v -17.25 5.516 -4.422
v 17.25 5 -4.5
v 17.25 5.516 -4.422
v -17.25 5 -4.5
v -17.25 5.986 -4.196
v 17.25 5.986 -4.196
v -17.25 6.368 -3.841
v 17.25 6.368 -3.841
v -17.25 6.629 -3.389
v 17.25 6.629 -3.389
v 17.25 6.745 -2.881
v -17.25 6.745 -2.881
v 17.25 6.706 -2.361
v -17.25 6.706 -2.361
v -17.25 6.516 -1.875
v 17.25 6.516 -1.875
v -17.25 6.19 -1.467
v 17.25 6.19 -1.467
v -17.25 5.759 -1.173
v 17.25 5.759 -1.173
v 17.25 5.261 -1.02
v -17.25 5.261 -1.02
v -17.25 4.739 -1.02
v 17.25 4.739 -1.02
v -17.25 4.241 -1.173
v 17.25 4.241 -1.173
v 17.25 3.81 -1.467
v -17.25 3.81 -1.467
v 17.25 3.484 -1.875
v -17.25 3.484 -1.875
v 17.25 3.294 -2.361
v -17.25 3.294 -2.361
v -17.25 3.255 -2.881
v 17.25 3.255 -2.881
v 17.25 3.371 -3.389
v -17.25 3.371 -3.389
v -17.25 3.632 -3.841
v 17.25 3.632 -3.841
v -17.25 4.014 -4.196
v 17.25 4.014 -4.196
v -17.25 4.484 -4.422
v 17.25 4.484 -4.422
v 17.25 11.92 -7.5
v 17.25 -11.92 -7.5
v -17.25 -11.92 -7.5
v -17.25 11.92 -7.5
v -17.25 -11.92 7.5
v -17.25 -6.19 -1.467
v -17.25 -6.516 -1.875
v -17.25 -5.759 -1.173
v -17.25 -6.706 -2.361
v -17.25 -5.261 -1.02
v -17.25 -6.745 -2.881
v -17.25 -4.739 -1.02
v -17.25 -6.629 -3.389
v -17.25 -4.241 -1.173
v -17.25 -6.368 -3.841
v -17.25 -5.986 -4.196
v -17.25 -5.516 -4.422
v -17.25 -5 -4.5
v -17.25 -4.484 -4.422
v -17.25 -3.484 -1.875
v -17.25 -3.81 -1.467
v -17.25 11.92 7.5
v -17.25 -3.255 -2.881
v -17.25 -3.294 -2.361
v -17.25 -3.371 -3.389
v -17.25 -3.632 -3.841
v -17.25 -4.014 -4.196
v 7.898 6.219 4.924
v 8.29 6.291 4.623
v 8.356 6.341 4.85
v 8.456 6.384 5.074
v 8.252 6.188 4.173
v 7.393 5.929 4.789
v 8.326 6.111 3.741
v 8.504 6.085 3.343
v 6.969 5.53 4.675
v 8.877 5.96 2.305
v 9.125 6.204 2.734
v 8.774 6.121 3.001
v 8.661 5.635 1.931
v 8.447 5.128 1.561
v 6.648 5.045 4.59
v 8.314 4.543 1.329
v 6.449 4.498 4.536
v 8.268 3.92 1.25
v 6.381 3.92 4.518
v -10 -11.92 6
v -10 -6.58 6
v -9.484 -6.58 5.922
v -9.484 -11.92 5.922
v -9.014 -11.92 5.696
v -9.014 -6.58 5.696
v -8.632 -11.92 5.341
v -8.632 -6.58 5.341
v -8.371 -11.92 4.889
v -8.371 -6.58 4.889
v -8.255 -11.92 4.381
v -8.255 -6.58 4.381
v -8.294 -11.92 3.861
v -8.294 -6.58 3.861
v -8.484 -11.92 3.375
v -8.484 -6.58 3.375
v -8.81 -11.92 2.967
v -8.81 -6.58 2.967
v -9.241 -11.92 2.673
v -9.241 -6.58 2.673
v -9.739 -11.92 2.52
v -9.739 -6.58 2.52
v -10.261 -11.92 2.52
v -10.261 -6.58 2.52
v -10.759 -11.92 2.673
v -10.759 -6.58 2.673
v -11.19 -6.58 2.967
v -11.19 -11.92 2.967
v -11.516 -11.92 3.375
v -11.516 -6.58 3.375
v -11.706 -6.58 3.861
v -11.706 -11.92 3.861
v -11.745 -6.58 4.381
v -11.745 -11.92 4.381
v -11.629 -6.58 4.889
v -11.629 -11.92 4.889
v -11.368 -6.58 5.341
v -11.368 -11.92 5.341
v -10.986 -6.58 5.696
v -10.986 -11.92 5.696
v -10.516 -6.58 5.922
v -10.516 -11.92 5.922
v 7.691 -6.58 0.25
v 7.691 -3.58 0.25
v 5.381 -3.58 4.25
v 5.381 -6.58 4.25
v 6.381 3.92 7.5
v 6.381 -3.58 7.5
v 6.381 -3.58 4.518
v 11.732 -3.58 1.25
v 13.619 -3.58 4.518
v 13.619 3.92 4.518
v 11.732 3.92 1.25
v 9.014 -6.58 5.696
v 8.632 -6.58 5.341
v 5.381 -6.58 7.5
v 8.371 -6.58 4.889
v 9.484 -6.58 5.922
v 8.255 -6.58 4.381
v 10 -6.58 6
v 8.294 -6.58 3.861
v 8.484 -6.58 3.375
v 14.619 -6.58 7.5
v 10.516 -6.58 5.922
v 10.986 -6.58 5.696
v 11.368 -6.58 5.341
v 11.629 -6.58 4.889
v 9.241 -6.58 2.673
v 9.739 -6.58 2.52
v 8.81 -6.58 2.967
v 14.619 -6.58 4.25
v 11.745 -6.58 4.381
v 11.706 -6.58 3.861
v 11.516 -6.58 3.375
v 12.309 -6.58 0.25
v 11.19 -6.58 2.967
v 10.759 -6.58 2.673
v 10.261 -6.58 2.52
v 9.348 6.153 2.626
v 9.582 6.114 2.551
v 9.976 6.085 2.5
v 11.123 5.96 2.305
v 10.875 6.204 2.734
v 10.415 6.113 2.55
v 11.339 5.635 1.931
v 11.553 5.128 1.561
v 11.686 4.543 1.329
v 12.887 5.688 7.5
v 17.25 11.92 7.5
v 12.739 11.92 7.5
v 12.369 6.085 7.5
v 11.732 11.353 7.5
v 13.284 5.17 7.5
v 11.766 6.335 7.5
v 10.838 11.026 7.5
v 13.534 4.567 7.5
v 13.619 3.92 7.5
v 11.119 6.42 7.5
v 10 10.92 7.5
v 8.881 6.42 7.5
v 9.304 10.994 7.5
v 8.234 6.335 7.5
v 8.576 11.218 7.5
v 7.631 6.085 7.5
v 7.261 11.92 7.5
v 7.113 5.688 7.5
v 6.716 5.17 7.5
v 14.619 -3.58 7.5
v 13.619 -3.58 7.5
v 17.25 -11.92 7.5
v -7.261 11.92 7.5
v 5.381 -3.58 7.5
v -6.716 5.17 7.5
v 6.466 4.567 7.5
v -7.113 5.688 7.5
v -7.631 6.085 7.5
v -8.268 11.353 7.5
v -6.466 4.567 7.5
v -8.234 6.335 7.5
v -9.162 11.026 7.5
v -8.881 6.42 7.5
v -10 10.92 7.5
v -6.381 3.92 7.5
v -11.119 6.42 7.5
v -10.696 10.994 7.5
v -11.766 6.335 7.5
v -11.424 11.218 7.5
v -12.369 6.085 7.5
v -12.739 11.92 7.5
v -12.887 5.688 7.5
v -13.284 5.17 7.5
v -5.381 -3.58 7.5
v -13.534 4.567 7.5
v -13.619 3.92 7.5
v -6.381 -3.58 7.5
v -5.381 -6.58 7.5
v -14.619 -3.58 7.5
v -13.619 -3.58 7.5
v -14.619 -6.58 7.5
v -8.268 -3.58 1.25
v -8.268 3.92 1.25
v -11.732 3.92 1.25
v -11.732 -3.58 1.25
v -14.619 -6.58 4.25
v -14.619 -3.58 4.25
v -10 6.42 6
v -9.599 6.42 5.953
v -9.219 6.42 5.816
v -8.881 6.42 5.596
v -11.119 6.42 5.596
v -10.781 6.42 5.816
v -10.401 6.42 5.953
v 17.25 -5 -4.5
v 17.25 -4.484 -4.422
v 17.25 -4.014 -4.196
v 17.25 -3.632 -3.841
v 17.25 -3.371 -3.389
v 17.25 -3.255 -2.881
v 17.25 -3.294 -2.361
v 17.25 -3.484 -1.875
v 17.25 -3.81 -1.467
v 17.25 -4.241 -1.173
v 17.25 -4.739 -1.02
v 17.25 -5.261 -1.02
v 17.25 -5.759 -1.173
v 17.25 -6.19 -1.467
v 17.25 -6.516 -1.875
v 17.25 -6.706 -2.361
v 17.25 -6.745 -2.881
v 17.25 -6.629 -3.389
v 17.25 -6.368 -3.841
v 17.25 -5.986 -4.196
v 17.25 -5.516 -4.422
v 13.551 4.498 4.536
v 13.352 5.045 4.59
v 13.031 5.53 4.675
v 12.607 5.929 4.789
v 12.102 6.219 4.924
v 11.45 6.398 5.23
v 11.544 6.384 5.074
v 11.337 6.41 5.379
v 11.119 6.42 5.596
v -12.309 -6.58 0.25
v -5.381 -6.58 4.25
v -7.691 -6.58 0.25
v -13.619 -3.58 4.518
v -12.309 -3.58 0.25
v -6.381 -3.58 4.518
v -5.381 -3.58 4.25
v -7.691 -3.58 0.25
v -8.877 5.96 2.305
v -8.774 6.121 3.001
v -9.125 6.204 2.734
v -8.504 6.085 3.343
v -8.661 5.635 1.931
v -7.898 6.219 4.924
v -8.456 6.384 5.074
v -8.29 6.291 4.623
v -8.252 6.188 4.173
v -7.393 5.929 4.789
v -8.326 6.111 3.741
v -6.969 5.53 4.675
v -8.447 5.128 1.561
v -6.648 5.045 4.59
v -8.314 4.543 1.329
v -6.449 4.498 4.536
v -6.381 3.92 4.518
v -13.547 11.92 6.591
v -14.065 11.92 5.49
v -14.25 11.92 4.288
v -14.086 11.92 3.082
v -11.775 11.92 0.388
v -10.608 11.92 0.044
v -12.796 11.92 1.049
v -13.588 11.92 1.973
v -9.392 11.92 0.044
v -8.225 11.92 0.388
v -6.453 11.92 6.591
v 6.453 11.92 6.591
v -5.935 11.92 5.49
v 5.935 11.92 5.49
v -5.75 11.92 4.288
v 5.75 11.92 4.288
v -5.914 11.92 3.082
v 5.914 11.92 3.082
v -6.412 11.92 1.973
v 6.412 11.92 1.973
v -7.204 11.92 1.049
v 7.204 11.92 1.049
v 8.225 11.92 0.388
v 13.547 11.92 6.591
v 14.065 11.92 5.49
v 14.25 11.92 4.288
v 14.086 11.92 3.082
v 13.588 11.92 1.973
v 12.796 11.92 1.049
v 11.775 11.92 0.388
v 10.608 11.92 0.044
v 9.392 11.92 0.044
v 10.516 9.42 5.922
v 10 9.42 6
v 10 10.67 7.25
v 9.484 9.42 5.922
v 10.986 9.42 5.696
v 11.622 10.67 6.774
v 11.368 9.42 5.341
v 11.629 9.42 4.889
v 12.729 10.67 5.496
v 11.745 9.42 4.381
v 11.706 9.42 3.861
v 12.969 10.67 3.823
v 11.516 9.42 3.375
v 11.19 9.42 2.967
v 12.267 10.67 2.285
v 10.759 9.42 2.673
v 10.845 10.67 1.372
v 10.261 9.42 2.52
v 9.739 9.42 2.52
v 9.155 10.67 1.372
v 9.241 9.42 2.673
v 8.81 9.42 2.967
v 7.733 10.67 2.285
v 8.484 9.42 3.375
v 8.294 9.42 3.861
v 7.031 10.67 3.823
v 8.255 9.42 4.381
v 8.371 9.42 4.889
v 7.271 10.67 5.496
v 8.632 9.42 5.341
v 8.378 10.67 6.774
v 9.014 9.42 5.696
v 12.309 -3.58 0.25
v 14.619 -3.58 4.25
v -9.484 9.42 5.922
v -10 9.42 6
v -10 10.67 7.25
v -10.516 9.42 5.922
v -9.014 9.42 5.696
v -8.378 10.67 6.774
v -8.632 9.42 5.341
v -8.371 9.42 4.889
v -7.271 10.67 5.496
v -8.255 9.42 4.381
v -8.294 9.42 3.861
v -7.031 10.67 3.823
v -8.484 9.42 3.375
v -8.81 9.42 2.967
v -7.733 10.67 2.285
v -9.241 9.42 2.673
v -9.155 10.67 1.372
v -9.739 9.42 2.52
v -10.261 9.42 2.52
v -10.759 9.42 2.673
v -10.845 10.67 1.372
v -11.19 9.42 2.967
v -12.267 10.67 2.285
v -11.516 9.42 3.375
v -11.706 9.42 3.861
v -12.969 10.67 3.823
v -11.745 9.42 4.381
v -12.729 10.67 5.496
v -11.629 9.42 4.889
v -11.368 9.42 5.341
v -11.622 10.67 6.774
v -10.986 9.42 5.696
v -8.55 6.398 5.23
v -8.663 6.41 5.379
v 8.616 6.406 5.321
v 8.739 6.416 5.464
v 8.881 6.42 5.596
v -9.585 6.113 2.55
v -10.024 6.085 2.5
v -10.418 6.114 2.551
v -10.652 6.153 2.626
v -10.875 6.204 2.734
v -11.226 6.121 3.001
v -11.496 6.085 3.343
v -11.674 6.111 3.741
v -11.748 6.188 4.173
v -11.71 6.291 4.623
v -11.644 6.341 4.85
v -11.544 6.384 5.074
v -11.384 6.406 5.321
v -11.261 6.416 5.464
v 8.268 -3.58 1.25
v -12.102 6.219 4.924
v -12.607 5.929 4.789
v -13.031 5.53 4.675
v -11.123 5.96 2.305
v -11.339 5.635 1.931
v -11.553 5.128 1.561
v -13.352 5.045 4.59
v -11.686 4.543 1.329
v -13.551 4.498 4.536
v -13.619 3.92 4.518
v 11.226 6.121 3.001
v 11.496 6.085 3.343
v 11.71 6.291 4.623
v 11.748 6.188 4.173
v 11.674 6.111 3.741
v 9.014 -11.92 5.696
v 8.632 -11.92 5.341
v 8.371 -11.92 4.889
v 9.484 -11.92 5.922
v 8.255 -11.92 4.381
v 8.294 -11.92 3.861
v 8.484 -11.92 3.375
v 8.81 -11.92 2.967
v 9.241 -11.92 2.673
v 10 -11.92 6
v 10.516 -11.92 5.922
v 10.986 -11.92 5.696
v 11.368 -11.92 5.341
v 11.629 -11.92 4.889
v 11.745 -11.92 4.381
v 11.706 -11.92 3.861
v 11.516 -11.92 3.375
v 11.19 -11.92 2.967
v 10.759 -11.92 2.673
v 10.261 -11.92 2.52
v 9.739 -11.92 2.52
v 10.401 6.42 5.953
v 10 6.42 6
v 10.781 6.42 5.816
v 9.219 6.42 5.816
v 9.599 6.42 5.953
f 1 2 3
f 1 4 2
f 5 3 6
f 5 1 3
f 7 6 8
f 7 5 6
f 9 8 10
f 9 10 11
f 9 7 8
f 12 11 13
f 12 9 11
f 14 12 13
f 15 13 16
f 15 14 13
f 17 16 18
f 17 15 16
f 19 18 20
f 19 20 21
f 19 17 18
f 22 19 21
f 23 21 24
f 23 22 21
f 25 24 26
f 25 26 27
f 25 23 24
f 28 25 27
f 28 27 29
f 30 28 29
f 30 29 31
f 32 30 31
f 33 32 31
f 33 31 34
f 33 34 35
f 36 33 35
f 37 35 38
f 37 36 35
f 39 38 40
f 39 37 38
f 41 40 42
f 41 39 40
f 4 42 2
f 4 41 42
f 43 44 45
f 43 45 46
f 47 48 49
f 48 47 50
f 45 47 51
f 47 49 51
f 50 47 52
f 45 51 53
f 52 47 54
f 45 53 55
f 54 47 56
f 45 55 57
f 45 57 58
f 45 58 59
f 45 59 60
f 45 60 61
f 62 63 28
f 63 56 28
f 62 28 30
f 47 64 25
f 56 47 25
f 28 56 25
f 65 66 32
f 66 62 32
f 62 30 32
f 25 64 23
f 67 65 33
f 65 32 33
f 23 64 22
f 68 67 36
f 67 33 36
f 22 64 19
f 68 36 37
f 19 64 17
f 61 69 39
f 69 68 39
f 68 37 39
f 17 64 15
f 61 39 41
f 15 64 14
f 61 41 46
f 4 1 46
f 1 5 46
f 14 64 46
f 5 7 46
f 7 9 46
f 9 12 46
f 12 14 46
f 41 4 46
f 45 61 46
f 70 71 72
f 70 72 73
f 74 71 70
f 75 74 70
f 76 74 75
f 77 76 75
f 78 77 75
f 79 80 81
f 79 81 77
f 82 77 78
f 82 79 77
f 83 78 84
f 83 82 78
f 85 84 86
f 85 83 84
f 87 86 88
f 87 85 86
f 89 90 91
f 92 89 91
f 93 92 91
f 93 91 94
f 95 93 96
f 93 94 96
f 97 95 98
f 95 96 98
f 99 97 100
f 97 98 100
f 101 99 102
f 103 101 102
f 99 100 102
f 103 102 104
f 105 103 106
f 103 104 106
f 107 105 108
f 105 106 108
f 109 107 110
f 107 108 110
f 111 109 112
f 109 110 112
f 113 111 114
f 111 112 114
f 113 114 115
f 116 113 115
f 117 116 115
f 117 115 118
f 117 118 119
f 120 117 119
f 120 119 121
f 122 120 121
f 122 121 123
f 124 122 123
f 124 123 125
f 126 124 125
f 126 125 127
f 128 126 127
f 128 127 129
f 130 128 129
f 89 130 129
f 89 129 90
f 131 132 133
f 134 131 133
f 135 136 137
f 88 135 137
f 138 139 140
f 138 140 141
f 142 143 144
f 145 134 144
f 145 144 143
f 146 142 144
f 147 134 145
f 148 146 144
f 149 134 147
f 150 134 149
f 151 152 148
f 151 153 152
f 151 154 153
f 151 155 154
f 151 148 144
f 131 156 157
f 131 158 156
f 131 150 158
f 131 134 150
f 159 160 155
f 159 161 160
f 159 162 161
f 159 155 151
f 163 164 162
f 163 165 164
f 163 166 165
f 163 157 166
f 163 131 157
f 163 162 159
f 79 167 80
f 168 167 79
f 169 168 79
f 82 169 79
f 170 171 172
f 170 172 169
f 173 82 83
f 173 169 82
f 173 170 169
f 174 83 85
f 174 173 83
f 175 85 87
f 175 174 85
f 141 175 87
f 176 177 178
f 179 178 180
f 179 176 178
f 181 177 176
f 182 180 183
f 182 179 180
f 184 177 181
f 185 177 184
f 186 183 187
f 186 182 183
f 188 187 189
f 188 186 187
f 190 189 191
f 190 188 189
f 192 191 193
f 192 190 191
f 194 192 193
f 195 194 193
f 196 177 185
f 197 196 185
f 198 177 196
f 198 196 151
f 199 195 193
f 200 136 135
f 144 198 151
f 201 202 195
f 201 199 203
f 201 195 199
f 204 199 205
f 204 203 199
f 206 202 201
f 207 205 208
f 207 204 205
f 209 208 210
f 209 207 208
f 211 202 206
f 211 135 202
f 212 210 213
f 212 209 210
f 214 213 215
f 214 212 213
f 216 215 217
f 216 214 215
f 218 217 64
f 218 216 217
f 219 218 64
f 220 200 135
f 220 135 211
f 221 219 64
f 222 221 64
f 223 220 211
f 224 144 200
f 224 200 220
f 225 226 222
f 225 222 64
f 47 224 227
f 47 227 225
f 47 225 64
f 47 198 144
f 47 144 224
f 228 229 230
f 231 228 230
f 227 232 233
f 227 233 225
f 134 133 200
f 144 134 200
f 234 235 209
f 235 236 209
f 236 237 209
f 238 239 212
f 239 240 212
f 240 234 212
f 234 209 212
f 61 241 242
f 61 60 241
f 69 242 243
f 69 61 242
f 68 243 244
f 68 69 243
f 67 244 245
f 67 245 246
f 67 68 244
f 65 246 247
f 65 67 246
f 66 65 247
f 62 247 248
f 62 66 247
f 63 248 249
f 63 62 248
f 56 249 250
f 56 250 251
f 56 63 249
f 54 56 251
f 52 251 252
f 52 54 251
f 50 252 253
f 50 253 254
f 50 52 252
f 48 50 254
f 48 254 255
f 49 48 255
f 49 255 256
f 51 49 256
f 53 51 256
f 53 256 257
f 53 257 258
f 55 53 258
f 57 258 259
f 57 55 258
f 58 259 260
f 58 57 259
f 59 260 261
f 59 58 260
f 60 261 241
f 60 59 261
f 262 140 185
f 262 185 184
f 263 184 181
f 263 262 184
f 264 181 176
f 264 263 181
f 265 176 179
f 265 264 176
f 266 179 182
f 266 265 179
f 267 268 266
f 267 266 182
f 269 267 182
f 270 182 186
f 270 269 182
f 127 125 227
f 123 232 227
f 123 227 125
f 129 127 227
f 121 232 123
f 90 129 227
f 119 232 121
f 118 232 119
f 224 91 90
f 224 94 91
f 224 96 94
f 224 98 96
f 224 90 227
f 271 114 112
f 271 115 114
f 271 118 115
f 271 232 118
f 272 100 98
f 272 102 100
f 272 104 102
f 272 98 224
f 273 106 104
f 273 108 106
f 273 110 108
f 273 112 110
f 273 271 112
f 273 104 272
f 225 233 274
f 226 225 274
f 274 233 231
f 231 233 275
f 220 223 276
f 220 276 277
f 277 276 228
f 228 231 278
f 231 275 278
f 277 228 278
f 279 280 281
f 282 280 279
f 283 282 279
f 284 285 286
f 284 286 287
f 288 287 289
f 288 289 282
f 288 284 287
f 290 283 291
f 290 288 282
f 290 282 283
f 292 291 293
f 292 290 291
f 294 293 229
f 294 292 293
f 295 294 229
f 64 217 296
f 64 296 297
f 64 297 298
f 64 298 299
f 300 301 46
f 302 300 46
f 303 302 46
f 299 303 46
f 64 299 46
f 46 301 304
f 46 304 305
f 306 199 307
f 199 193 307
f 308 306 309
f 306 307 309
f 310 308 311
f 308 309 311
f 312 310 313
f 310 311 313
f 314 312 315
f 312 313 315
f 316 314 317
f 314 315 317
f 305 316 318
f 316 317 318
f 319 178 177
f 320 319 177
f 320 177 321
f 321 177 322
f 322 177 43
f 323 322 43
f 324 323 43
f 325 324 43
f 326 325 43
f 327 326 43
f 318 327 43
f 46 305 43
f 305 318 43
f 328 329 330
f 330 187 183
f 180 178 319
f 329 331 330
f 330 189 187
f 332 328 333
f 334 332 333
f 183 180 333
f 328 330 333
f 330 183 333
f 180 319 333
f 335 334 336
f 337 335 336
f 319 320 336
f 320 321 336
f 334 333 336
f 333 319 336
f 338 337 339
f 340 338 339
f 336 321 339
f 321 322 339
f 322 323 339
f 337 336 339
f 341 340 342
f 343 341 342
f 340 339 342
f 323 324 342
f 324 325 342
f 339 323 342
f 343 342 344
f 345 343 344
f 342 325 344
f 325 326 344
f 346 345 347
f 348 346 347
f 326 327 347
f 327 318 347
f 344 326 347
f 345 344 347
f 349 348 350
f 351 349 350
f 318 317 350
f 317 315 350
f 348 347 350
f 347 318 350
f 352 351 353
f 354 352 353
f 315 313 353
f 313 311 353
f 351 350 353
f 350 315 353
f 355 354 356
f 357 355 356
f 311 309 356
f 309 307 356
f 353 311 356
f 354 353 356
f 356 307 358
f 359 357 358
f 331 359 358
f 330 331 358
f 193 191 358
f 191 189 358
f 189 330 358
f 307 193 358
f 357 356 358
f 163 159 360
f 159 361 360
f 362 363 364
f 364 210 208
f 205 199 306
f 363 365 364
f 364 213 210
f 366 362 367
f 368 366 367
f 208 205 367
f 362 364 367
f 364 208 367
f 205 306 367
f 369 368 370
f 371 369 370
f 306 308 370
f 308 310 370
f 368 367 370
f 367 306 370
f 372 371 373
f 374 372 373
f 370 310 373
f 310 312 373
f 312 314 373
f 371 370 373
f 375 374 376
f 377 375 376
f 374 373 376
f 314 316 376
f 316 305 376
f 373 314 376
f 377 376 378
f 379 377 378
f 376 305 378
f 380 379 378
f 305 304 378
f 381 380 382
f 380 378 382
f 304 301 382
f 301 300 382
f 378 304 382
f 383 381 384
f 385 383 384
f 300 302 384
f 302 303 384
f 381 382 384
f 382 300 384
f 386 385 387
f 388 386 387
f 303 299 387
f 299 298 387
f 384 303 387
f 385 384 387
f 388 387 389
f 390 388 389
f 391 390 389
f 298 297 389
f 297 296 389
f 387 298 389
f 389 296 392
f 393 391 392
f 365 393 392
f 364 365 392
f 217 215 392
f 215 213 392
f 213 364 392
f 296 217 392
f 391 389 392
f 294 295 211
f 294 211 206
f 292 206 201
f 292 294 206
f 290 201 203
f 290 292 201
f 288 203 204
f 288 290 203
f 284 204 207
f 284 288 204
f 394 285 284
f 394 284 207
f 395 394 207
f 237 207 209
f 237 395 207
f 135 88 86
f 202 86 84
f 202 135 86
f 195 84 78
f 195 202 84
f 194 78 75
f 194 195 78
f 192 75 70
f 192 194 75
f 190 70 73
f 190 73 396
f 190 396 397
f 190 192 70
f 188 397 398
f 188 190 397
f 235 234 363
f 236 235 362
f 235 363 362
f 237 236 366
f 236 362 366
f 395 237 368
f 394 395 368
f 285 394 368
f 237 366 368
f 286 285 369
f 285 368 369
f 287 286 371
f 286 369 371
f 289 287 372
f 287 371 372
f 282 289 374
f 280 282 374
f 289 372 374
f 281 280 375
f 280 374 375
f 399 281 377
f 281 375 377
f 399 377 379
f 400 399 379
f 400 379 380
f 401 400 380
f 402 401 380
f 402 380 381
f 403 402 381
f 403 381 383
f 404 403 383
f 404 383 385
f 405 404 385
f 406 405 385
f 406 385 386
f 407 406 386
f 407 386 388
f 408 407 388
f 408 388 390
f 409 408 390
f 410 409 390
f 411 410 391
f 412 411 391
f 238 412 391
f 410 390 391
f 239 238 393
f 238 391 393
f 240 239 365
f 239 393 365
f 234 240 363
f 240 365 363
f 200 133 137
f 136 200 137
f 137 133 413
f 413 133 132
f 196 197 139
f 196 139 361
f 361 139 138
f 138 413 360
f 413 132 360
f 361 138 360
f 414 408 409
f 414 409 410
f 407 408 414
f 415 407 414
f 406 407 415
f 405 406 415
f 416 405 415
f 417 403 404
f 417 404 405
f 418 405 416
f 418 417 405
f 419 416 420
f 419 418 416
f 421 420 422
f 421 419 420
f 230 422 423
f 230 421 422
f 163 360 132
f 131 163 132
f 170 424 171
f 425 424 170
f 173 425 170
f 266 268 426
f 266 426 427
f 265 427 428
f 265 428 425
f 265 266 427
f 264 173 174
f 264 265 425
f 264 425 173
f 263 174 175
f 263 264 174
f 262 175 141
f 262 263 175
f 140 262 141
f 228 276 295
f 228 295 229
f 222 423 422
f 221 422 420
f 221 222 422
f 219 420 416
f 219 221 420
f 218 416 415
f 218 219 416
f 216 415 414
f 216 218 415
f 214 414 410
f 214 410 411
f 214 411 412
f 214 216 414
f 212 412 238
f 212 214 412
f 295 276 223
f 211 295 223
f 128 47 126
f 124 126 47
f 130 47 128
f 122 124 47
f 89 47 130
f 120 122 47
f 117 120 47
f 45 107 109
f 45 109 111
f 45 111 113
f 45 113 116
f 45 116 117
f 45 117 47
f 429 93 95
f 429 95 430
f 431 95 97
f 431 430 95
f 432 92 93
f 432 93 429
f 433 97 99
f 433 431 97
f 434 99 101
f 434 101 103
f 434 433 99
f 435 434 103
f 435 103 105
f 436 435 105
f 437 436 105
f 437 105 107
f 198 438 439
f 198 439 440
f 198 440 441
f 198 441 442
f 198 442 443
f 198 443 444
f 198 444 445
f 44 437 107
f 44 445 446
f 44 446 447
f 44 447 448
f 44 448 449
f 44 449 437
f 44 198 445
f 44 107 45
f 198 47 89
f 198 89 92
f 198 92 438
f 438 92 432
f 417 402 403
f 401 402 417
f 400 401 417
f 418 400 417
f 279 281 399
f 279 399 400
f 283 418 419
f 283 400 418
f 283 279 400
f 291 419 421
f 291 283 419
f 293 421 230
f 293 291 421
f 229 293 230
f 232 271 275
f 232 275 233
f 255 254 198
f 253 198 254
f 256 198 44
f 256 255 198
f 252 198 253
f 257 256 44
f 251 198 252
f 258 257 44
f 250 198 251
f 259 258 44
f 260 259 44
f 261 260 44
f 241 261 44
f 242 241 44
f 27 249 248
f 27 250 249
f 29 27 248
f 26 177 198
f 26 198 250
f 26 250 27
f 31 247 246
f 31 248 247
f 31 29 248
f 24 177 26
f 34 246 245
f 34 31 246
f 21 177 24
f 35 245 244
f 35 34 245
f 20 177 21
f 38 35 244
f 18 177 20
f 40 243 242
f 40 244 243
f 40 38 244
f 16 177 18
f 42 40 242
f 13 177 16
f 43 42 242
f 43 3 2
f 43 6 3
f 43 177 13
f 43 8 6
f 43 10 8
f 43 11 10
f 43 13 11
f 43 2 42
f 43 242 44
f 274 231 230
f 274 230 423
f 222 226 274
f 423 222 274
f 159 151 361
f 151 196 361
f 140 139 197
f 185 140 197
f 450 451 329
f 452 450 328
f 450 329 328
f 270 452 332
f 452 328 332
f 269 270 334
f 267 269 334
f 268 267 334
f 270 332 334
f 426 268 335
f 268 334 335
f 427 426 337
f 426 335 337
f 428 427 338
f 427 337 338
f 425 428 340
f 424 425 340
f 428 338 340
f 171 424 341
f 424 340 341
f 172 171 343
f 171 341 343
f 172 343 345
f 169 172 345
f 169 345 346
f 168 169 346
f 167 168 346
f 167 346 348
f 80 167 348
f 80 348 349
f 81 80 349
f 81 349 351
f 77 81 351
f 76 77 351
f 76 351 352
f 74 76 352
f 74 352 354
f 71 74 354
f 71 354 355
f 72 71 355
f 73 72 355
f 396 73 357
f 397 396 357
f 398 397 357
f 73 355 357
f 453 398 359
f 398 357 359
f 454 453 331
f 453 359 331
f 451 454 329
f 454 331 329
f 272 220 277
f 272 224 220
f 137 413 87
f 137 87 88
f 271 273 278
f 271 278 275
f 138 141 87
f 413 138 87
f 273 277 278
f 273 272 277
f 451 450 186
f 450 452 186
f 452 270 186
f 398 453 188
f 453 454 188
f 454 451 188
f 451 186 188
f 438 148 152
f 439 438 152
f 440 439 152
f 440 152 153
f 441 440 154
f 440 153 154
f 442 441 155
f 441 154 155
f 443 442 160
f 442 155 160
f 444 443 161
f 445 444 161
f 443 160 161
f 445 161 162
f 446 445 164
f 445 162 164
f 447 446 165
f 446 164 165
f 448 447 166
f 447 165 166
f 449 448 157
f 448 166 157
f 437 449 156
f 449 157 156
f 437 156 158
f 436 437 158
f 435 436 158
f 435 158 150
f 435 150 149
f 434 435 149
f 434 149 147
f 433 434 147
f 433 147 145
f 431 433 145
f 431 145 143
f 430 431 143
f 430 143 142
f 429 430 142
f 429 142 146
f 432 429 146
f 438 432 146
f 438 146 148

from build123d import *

# Parameters (mm, degrees)
SKETCH1_W           = 15
SKETCH1_H           = 23.84
SKETCH1_R           = 1.75
BOSS_EXTRUDE1_DEPTH = 17.25
SKETCH2_R           = 1.75
CUT_EXTRUDE1_DEPTH  = 31.367056163
CHAMFER1_SIZE       = 2.5
CUT_EXTRUDE2_DEPTH  = 1.5
CUT_EXTRUDE3_DEPTH  = 10
FILLET2_R           = 2.5


with BuildPart() as part:
    # Sketch1 → Boss-Extrude1 (new, symmetric)
    with BuildSketch(Plane(origin=(0, 0, 0), x_dir=(0, 0, -1), z_dir=(1, 0, 0))):
        Rectangle(SKETCH1_W, SKETCH1_H)
        with Locations((2.75, 5)):
            Circle(SKETCH1_R, mode=Mode.SUBTRACT)
        with Locations((2.75, -5)):
            Circle(SKETCH1_R, mode=Mode.SUBTRACT)
    extrude(amount=BOSS_EXTRUDE1_DEPTH, both=True)

    # Sketch2 → Cut-Extrude1 (cut, through all)
    with BuildSketch(Plane(origin=(0, 11.92, 0), x_dir=(1, 0, 0), z_dir=(0, 1, 0))):
        with Locations(Location((-10, -4.25, 0), (0, 0, 270))):
            Circle(SKETCH2_R)
        with Locations(Location((10, -4.25, 0), (0, 0, 270))):
            Circle(SKETCH2_R)
    extrude(amount=-CUT_EXTRUDE1_DEPTH, mode=Mode.SUBTRACT)

    # Chamfer1
    # the kernel refuses this chamfer: 2.5 mm, written as the material it takes off along each edge
    with BuildSketch(Plane(origin=(-10, 11.92, 4.25), x_dir=(0, 0, 1), z_dir=(-1, 0, 0))) as chamfer1_piece_1:
        Polygon((1.75, -CHAMFER1_SIZE), (1.75 + CHAMFER1_SIZE, 0), (1.75, 0), align=None)
    revolve(axis=Axis((-10, 11.92, 4.25), (0, 1, 0)), mode=Mode.SUBTRACT)
    with BuildSketch(Plane(origin=(10, 11.92, 4.25), x_dir=(0, 0, 1), z_dir=(-1, 0, 0))) as chamfer1_piece_2:
        Polygon((1.75, -CHAMFER1_SIZE), (1.75 + CHAMFER1_SIZE, 0), (1.75, 0), align=None)
    revolve(axis=Axis((10, 11.92, 4.25), (0, 1, 0)), mode=Mode.SUBTRACT)

    # Sketch3 → Cut-Extrude2 (cut, symmetric)
    with BuildSketch(Plane(origin=(0, -5.08, 0), x_dir=(1, 0, 0), z_dir=(0, 1, 0))):
        Polygon((-14.618802154, -4.25), (-14.618802154, -7.5), (-5.381197846, -7.5), (-5.381197846, -4.25), (-7.690598923, -0.25), (-12.309401077, -0.25), align=None)
        Polygon((14.618802154, -4.25), (12.309401077, -0.25), (7.690598923, -0.25), (5.381197846, -4.25), (5.381197846, -7.5), (14.618802154, -7.5), align=None)
    extrude(amount=CUT_EXTRUDE2_DEPTH, both=True, mode=Mode.SUBTRACT)

    # Sketch4 → Cut-Extrude3 (cut)
    with BuildSketch(Plane.XZ.offset(3.58)):
        Polygon((-13.618802154, 6.5), (-13.618802154, 7.5), (-6.381197846, 7.5), (-6.381197846, 6.5), (-6.381197846, 4.517949192), (-8.267949192, 1.25), (-11.732050808, 1.25), (-13.618802154, 4.517949192), align=None)
        Polygon((6.381197846, 6.5), (6.381197846, 7.5), (13.618802154, 7.5), (13.618802154, 6.5), (13.618802154, 4.517949192), (11.732050808, 1.25), (8.267949192, 1.25), (6.381197846, 4.517949192), align=None)
    extrude(amount=-CUT_EXTRUDE3_DEPTH, mode=Mode.SUBTRACT)

    # Fillet2
    # the kernel refuses this fillet: 2.5 mm, written as the material it adds along each edge
    with BuildSketch(Plane(origin=(-6.381197846, 6.42, -1.732050808), x_dir=(0, -1, 0), z_dir=(0, 0, 1))) as fillet2_piece_1_section:
        with BuildLine():
            CenterArc((FILLET2_R, -FILLET2_R), FILLET2_R, 90, 90)
            Line((0, -FILLET2_R), (0, 0))
            Line((0, 0), (FILLET2_R, 0))
        make_face()
    fillet2_piece_1 = extrude(amount=9.232050808, mode=Mode.PRIVATE)
    fillet2_piece_1 = fillet2_piece_1 - Plane(origin=(-10, 5.915860335, 4.25), x_dir=(0, 0, 1), z_dir=(0, 1, 0)) * Cylinder(1.75, 29, mode=Mode.PRIVATE)
    fillet2_piece_1 = split(fillet2_piece_1, bisect_by=Plane(origin=(-7.028837061, 5.915860335, 1.25), z_dir=(0, 0, 1)), keep=Keep.TOP, mode=Mode.PRIVATE)
    add(fillet2_piece_1)
    with BuildSketch(Plane(origin=(-3.256197846, 6.42, 9.930607966), x_dir=(-0.8660254037844386, 0, 0.5000000000000002), z_dir=(-0.5000000000000002, 0, -0.8660254037844386))) as fillet2_piece_2_section:
        with BuildLine():
            CenterArc((FILLET2_R, -FILLET2_R), FILLET2_R, 90, 90)
            Line((0, -FILLET2_R), (0, 0))
            Line((0, 0), (FILLET2_R, 0))
        make_face()
    fillet2_piece_2 = extrude(amount=16.273502692, mode=Mode.PRIVATE)
    fillet2_piece_2 = split(fillet2_piece_2, bisect_by=Plane(origin=(-7.669827192, 5.902188102, 7.5), z_dir=(0, 0, -1)), keep=Keep.TOP, mode=Mode.PRIVATE)
    fillet2_piece_2 = fillet2_piece_2 - Plane(origin=(-10, 5.902188102, 4.25), x_dir=(0, 0, 1), z_dir=(0, 1, 0)) * Cylinder(1.75, 43, mode=Mode.PRIVATE)
    fillet2_piece_2 = split(fillet2_piece_2, bisect_by=Plane(origin=(-7.669827192, 5.902188102, 1.25), z_dir=(0, 0, 1)), keep=Keep.TOP, mode=Mode.PRIVATE)
    add(fillet2_piece_2)
    with BuildSketch(Plane(origin=(-2.017949192, 6.42, 1.25), x_dir=(0, 0, 1), z_dir=(-1, 0, 0))) as fillet2_piece_3_section:
        with BuildLine():
            CenterArc((FILLET2_R, -FILLET2_R), FILLET2_R, 90, 90)
            Line((0, -FILLET2_R), (0, 0))
            Line((0, 0), (FILLET2_R, 0))
        make_face()
    fillet2_piece_3 = extrude(amount=15.964101615, mode=Mode.PRIVATE)
    fillet2_piece_3 = fillet2_piece_3 - Plane(origin=(-10, 5.877722241, 4.25), x_dir=(0, 0, 1), z_dir=(0, 1, 0)) * Cylinder(1.75, 42, mode=Mode.PRIVATE)
    fillet2_piece_3 = split(fillet2_piece_3, bisect_by=Plane(origin=(-11.54711457, 5.877722241, 0.92968104), z_dir=(0.8660254037844384, 0, 0.5000000000000006)), keep=Keep.TOP, mode=Mode.PRIVATE)
    add(fillet2_piece_3)
    with BuildSketch(Plane(origin=(-8.607050808, 6.42, -4.162658774), x_dir=(0.8660254037844384, 0, 0.5000000000000004), z_dir=(-0.5000000000000006, 0, 0.8660254037844384))) as fillet2_piece_4_section:
        with BuildLine():
            CenterArc((FILLET2_R, -FILLET2_R), FILLET2_R, 90, 90)
            Line((0, -FILLET2_R), (0, 0))
            Line((0, 0), (FILLET2_R, 0))
        make_face()
    fillet2_piece_4 = extrude(amount=16.273502692, mode=Mode.PRIVATE)
    fillet2_piece_4 = split(fillet2_piece_4, bisect_by=Plane(origin=(-12.330172795, 5.902188104, 7.5), z_dir=(0, 0, -1)), keep=Keep.TOP, mode=Mode.PRIVATE)
    fillet2_piece_4 = fillet2_piece_4 - Plane(origin=(-10, 5.902188104, 4.25), x_dir=(0, 0, 1), z_dir=(0, 1, 0)) * Cylinder(1.75, 43, mode=Mode.PRIVATE)
    fillet2_piece_4 = split(fillet2_piece_4, bisect_by=Plane(origin=(-12.330172795, 5.902188104, 1.25), z_dir=(0, 0, 1)), keep=Keep.TOP, mode=Mode.PRIVATE)
    add(fillet2_piece_4)
    with BuildSketch(Plane(origin=(-13.618802154, 6.42, 7.5), x_dir=(1, 0, 0), z_dir=(0, 0, -1))) as fillet2_piece_5_section:
        with BuildLine():
            CenterArc((FILLET2_R, FILLET2_R), FILLET2_R, 180, 90)
            Line((0, FILLET2_R), (0, 0))
            Line((0, 0), (FILLET2_R, 0))
        make_face()
    fillet2_piece_5 = extrude(amount=9.232050808, mode=Mode.PRIVATE)
    fillet2_piece_5 = fillet2_piece_5 - Plane(origin=(-10, 5.915860467, 4.25), x_dir=(0, 0, 1), z_dir=(0, 1, 0)) * Cylinder(1.75, 29, mode=Mode.PRIVATE)
    fillet2_piece_5 = split(fillet2_piece_5, bisect_by=Plane(origin=(-13.860643718, 5.915860467, 4.936831069), z_dir=(0.8660254037844384, 0, 0.5000000000000006)), keep=Keep.TOP, mode=Mode.PRIVATE)
    add(fillet2_piece_5)
    with BuildSketch(Plane(origin=(13.618802154, 6.42, -1.732050808), x_dir=(0, -1, 0), z_dir=(0, 0, 1))) as fillet2_piece_6_section:
        with BuildLine():
            CenterArc((FILLET2_R, -FILLET2_R), FILLET2_R, 90, 90)
            Line((0, -FILLET2_R), (0, 0))
            Line((0, 0), (FILLET2_R, 0))
        make_face()
    fillet2_piece_6 = extrude(amount=9.232050808, mode=Mode.PRIVATE)
    fillet2_piece_6 = fillet2_piece_6 - Plane(origin=(10, 5.915860335, 4.25), x_dir=(0, 0, 1), z_dir=(0, 1, 0)) * Cylinder(1.75, 29, mode=Mode.PRIVATE)
    fillet2_piece_6 = split(fillet2_piece_6, bisect_by=Plane(origin=(12.971162939, 5.915860335, 1.25), z_dir=(0, 0, 1)), keep=Keep.TOP, mode=Mode.PRIVATE)
    add(fillet2_piece_6)
    with BuildSketch(Plane(origin=(16.743802154, 6.42, 9.930607966), x_dir=(-0.8660254037844389, 0, 0.49999999999999956), z_dir=(-0.4999999999999996, 0, -0.8660254037844389))) as fillet2_piece_7_section:
        with BuildLine():
            CenterArc((FILLET2_R, -FILLET2_R), FILLET2_R, 90, 90)
            Line((0, -FILLET2_R), (0, 0))
            Line((0, 0), (FILLET2_R, 0))
        make_face()
    fillet2_piece_7 = extrude(amount=16.273502692, mode=Mode.PRIVATE)
    fillet2_piece_7 = split(fillet2_piece_7, bisect_by=Plane(origin=(12.330172808, 5.902188102, 7.5), z_dir=(0, 0, -1)), keep=Keep.TOP, mode=Mode.PRIVATE)
    fillet2_piece_7 = fillet2_piece_7 - Plane(origin=(10, 5.902188102, 4.25), x_dir=(0, 0, 1), z_dir=(0, 1, 0)) * Cylinder(1.75, 43, mode=Mode.PRIVATE)
    fillet2_piece_7 = split(fillet2_piece_7, bisect_by=Plane(origin=(12.330172808, 5.902188102, 1.25), z_dir=(0, 0, 1)), keep=Keep.TOP, mode=Mode.PRIVATE)
    add(fillet2_piece_7)
    with BuildSketch(Plane(origin=(17.982050808, 6.42, 1.25), x_dir=(0, 0, 1), z_dir=(-1, 0, 0))) as fillet2_piece_8_section:
        with BuildLine():
            CenterArc((FILLET2_R, -FILLET2_R), FILLET2_R, 90, 90)
            Line((0, -FILLET2_R), (0, 0))
            Line((0, 0), (FILLET2_R, 0))
        make_face()
    fillet2_piece_8 = extrude(amount=15.964101615, mode=Mode.PRIVATE)
    fillet2_piece_8 = fillet2_piece_8 - Plane(origin=(10, 5.877722241, 4.25), x_dir=(0, 0, 1), z_dir=(0, 1, 0)) * Cylinder(1.75, 42, mode=Mode.PRIVATE)
    fillet2_piece_8 = split(fillet2_piece_8, bisect_by=Plane(origin=(11.547114576, 5.877722241, 0.92968105), z_dir=(-0.8660254037844389, 0, 0.4999999999999996)), keep=Keep.TOP, mode=Mode.PRIVATE)
    add(fillet2_piece_8)
    with BuildSketch(Plane(origin=(11.392949192, 6.42, -4.162658774), x_dir=(0.8660254037844389, 0, 0.49999999999999956), z_dir=(-0.4999999999999996, 0, 0.8660254037844389))) as fillet2_piece_9_section:
        with BuildLine():
            CenterArc((FILLET2_R, -FILLET2_R), FILLET2_R, 90, 90)
            Line((0, -FILLET2_R), (0, 0))
            Line((0, 0), (FILLET2_R, 0))
        make_face()
    fillet2_piece_9 = extrude(amount=16.273502692, mode=Mode.PRIVATE)
    fillet2_piece_9 = split(fillet2_piece_9, bisect_by=Plane(origin=(7.669827205, 5.902188104, 7.5), z_dir=(0, 0, -1)), keep=Keep.TOP, mode=Mode.PRIVATE)
    fillet2_piece_9 = fillet2_piece_9 - Plane(origin=(10, 5.902188104, 4.25), x_dir=(0, 0, 1), z_dir=(0, 1, 0)) * Cylinder(1.75, 43, mode=Mode.PRIVATE)
    fillet2_piece_9 = split(fillet2_piece_9, bisect_by=Plane(origin=(7.669827205, 5.902188104, 1.25), z_dir=(0, 0, 1)), keep=Keep.TOP, mode=Mode.PRIVATE)
    add(fillet2_piece_9)
    with BuildSketch(Plane(origin=(6.381197846, 6.42, 7.5), x_dir=(1, 0, 0), z_dir=(0, 0, -1))) as fillet2_piece_10_section:
        with BuildLine():
            CenterArc((FILLET2_R, FILLET2_R), FILLET2_R, 180, 90)
            Line((0, FILLET2_R), (0, 0))
            Line((0, 0), (FILLET2_R, 0))
        make_face()
    fillet2_piece_10 = extrude(amount=9.232050808, mode=Mode.PRIVATE)
    fillet2_piece_10 = fillet2_piece_10 - Plane(origin=(10, 5.915860467, 4.25), x_dir=(0, 0, 1), z_dir=(0, 1, 0)) * Cylinder(1.75, 29, mode=Mode.PRIVATE)
    fillet2_piece_10 = split(fillet2_piece_10, bisect_by=Plane(origin=(6.139356282, 5.915860467, 4.936831069), z_dir=(0.8660254037844389, 0, 0.4999999999999996)), keep=Keep.TOP, mode=Mode.PRIVATE)
    add(fillet2_piece_10)


solid = part.part
